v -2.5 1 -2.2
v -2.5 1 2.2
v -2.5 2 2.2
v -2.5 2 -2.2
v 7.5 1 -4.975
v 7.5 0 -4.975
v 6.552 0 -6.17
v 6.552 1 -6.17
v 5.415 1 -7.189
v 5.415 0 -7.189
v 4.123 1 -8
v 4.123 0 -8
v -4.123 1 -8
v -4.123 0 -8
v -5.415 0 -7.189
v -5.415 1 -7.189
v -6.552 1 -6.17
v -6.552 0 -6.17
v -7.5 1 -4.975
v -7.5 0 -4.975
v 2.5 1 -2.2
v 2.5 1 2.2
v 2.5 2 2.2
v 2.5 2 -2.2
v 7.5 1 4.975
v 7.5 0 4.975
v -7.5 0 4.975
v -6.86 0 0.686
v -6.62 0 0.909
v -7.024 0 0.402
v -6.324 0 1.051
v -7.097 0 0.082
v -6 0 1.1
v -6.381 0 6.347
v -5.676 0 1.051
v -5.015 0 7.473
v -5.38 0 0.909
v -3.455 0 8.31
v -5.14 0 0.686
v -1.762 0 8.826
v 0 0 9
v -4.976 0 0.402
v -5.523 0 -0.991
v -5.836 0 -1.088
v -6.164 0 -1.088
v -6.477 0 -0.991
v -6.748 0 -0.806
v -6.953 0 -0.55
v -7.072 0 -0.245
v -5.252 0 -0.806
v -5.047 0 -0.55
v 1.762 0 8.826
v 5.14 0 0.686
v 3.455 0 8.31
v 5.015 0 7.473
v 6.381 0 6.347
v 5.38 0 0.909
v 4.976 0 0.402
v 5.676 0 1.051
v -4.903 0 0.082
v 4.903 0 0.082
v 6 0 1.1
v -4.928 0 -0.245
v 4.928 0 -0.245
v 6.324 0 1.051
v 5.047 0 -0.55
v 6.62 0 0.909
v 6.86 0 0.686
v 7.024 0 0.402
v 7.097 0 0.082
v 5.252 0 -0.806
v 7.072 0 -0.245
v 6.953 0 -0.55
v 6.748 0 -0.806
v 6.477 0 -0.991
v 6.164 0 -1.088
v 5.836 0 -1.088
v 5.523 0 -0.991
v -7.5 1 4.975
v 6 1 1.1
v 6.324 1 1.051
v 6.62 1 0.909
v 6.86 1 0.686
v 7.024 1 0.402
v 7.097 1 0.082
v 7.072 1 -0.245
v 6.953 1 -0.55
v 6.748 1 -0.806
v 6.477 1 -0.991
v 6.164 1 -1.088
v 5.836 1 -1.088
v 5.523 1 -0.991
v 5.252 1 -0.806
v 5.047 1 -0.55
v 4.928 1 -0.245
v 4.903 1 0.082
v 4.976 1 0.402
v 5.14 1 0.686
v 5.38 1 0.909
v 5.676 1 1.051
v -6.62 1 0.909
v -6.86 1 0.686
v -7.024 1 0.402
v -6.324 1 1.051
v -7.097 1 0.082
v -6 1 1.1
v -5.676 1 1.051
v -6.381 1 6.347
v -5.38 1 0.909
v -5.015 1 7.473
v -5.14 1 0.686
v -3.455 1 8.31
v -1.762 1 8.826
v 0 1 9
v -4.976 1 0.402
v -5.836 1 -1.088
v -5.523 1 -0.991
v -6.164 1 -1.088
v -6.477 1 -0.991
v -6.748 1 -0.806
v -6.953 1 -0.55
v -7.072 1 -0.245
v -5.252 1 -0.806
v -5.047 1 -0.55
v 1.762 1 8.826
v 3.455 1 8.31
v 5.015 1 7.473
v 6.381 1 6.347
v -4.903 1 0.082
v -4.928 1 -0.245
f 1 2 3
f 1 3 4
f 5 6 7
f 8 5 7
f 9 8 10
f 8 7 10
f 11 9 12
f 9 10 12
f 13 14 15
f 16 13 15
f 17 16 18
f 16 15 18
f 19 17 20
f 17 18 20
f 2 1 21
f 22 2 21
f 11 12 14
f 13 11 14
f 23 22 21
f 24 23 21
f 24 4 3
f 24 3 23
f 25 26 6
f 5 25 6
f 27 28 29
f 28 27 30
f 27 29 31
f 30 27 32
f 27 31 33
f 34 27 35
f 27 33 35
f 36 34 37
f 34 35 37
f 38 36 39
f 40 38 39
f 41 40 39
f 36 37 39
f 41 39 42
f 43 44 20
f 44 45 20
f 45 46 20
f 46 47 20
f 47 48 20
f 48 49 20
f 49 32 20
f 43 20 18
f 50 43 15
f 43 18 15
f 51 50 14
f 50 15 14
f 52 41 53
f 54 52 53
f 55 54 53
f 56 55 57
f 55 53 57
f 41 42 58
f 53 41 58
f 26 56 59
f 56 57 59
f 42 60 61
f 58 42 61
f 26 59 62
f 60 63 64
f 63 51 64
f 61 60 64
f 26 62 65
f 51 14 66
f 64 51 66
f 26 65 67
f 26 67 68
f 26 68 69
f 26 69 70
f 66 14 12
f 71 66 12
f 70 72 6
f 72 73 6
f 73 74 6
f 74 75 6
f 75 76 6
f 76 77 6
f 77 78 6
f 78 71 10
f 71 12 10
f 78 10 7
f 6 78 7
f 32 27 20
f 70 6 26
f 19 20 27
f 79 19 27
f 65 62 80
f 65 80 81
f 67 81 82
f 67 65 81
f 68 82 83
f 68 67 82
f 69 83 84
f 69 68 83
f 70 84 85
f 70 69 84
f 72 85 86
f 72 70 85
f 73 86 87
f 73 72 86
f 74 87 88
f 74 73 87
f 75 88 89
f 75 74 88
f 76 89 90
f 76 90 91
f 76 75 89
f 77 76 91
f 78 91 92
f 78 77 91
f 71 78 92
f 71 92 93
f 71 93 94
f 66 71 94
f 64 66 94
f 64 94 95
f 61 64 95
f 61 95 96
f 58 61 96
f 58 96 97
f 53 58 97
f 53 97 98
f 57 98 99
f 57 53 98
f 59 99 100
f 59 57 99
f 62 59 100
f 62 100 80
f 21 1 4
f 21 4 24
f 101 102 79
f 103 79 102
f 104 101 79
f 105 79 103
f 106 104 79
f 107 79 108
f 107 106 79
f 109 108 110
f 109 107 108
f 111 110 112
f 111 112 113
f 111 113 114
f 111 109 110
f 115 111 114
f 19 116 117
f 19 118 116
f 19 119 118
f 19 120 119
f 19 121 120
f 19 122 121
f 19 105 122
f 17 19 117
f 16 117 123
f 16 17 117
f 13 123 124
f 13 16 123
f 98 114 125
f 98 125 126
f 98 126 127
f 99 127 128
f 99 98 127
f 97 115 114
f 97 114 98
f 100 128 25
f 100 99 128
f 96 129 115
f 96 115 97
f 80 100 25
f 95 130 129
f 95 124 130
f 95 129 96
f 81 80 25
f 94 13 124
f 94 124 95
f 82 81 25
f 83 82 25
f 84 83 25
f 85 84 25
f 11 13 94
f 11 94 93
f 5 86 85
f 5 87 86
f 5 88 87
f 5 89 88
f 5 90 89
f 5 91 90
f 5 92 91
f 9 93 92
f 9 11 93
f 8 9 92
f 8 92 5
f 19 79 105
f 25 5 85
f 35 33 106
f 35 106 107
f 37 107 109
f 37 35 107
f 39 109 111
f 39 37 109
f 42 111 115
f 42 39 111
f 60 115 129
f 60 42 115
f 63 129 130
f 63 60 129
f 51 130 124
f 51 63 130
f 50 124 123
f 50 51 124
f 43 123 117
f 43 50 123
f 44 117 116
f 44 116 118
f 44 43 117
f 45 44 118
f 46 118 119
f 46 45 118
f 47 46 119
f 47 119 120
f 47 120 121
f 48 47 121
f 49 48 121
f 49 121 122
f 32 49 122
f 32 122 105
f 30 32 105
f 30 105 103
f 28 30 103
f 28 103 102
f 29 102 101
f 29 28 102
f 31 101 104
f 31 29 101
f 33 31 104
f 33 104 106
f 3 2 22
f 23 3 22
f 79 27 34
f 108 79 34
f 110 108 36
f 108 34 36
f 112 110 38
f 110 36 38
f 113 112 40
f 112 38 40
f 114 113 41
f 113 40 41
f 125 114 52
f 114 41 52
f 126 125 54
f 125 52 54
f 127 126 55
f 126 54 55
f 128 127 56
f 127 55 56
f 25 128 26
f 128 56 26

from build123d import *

# Parameters (mm, degrees)
SKETCH_1_R      = 1.1
EXTRUDE_1_DEPTH = 1
EXTRUDE_START   = 1
SKETCH_3_W      = 5
SKETCH_3_H      = 4.4
EXTRUDE_2_DEPTH = 1


with BuildPart() as part:
    # Эскиз1 → Бобышка-Вытянуть1 (new body)
    with BuildSketch(Plane(origin=(0, 0, 0), x_dir=(1, 0, 0), z_dir=(0, 1, 0))):
        with BuildLine():
            Line((4.123105626, 8), (-4.123105626, 8))
            ThreePointArc((-4.123105626, 8), (-6.005155898, 6.703588789), (-7.5, 4.974937186))
            Line((-7.5, 4.974937186), (-7.5, -4.974937186))
            ThreePointArc((-7.5, -4.974937186), (0, -9), (7.5, -4.974937186))
            Line((7.5, -4.974937186), (7.5, 4.974937186))
            ThreePointArc((7.5, 4.974937186), (6.005155898, 6.703588789), (4.123105626, 8))
        make_face()
        with Locations(Location((-6, 0, 0), (0, 0, 270))):
            Circle(SKETCH_1_R, mode=Mode.SUBTRACT)
        with Locations(Location((6, 0, 0), (0, 0, 270))):
            Circle(SKETCH_1_R, mode=Mode.SUBTRACT)
    extrude(amount=EXTRUDE_1_DEPTH)


with BuildPart() as body_2:
    # Эскиз3 → Бобышка-Вытянуть2 (new body)
    with BuildSketch(Plane(origin=(0, 0, 0), x_dir=(1, 0, 0), z_dir=(0, 1, 0)).offset(EXTRUDE_START)):
        Rectangle(SKETCH_3_W, SKETCH_3_H)
    extrude(amount=EXTRUDE_2_DEPTH)


solid = Compound([part.part, body_2.part])
